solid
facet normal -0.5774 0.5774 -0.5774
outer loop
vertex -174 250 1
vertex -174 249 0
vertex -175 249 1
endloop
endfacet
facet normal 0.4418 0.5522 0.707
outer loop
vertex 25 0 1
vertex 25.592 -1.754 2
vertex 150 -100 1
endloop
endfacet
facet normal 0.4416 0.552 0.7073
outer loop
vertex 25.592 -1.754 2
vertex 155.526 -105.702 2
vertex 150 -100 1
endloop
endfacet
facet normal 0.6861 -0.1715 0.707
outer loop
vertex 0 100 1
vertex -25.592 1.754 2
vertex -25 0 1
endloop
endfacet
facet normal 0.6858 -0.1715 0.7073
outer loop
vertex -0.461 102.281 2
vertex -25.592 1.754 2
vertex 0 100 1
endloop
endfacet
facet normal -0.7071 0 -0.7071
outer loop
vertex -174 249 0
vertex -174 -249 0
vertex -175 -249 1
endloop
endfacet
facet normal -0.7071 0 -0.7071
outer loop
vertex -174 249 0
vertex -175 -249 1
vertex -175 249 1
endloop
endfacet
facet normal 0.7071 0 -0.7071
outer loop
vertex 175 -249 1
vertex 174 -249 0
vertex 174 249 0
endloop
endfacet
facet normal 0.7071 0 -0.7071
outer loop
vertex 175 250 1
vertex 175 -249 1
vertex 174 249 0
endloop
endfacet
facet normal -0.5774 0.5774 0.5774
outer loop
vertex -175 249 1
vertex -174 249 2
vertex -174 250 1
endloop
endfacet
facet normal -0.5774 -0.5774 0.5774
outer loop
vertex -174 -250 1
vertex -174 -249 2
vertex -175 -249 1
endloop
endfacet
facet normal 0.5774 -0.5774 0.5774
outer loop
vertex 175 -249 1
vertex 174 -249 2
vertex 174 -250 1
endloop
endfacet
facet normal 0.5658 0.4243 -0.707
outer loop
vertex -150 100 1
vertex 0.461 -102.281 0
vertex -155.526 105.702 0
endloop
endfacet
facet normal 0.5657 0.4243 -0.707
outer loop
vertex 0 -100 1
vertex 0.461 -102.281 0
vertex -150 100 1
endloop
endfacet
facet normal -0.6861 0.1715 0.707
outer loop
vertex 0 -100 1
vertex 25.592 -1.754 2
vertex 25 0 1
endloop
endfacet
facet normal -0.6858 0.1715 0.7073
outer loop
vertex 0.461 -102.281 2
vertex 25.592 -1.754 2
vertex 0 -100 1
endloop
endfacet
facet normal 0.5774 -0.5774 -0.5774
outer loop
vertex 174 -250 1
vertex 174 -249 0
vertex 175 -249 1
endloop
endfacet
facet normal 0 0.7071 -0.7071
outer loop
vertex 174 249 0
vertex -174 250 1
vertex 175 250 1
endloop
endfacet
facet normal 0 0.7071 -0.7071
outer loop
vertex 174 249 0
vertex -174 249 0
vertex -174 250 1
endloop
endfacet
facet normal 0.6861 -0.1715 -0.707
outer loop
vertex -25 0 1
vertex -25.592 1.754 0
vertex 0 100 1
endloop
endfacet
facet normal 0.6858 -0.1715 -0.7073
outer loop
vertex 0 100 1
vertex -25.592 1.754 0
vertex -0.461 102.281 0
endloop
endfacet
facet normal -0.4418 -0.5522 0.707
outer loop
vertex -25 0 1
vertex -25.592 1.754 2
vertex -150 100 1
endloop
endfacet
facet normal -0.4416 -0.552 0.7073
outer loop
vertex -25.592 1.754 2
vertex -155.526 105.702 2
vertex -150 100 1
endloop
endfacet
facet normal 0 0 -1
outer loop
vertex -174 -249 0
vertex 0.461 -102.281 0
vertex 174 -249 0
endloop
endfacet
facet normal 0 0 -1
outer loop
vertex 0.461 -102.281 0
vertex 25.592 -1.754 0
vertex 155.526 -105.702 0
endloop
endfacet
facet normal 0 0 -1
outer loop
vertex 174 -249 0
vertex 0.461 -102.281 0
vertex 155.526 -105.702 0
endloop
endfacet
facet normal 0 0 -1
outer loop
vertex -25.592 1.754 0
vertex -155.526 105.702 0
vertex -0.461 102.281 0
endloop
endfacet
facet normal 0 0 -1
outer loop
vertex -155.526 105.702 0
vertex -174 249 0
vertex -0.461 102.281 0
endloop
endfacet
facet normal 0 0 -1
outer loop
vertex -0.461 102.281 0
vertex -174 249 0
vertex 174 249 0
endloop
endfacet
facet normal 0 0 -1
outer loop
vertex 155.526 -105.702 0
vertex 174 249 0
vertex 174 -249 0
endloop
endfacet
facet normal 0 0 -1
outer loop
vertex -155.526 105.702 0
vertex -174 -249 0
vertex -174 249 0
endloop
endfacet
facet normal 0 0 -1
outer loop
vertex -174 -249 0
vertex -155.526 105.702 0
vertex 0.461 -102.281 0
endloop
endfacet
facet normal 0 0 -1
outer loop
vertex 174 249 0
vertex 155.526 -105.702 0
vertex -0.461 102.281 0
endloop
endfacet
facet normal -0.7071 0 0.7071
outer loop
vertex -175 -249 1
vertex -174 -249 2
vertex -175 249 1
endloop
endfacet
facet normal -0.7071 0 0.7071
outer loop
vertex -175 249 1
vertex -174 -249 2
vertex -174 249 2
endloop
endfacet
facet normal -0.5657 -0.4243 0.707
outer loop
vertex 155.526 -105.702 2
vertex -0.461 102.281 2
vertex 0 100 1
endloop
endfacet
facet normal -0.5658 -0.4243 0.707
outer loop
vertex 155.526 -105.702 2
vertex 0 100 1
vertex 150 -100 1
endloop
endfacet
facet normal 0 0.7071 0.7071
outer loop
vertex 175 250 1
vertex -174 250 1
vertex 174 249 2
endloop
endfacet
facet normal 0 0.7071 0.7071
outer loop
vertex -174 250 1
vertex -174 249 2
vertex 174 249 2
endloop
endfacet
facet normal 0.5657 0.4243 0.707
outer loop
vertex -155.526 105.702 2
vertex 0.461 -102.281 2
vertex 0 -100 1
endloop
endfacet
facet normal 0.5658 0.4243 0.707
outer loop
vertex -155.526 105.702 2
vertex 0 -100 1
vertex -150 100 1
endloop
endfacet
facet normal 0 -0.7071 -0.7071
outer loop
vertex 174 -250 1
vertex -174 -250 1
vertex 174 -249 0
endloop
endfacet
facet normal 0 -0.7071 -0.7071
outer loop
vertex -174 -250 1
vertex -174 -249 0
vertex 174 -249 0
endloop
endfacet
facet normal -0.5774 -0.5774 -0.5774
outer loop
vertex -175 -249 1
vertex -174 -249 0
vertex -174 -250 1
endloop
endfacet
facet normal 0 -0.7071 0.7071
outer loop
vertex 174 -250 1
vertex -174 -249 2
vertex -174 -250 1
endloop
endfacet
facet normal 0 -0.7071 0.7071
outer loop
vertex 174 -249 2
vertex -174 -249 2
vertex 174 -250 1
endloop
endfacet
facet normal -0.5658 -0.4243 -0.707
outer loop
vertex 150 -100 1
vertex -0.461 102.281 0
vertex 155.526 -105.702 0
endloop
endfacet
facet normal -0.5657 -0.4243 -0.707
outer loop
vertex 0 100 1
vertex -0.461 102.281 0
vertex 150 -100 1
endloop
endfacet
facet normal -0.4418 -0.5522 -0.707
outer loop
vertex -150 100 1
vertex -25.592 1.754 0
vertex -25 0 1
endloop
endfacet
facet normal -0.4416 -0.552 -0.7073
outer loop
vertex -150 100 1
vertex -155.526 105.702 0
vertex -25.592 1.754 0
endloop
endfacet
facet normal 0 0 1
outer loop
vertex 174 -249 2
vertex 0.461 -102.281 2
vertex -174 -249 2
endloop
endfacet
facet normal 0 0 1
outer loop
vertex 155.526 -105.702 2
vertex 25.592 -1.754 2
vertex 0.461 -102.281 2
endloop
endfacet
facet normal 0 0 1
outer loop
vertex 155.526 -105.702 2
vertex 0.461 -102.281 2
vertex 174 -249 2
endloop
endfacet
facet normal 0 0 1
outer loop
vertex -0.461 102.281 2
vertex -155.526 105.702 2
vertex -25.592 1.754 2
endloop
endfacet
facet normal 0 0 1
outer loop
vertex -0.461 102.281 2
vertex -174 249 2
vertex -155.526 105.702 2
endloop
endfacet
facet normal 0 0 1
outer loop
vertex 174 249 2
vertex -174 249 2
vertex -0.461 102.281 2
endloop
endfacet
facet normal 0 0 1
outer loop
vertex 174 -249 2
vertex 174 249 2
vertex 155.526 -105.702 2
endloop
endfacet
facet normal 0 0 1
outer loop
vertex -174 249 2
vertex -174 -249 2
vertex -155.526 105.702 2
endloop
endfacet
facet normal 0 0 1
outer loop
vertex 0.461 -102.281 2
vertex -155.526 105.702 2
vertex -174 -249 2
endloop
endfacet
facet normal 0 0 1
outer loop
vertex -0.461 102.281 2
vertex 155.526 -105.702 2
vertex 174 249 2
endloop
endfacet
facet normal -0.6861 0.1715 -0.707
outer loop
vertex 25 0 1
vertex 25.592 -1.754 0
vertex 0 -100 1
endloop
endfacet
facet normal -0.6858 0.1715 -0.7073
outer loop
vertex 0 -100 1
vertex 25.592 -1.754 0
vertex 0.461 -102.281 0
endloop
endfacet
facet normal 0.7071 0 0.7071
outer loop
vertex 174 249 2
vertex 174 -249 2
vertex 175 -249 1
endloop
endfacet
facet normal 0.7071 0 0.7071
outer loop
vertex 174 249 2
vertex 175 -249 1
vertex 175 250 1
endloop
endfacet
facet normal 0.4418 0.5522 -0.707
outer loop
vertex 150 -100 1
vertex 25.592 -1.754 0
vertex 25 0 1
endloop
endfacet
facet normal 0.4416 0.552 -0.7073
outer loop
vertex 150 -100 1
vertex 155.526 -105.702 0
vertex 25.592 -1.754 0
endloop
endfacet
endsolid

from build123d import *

# Parameters (mm, degrees)
F0_W     = 350
F0_H     = 500
F1_DEPTH = 2
F2_SIZE  = 0.99999


# Not quite as in the source:
# - a fillet or chamfer is up to 0.001 mm smaller than in the source, because OpenCascade refuses the exact size


with BuildPart() as f1:
    # F0 (on Top) → F1 (new body)
    with BuildSketch(Plane.XY):
        Rectangle(F0_W, F0_H)
        Polygon((150, 100), (150, -100), (0, -100), (-150, -100), (-150, 100), (0, 100), align=None, mode=Mode.SUBTRACT)
        Polygon((-150, -100), (0, -100), (-150, 100), align=None)
        Polygon((0, 100), (150, -100), (150, 100), align=None)
        Polygon((-25, 0), (0, 100), (-150, 100), align=None)
        Polygon((0, -100), (150, -100), (25, 0), align=None)
    extrude(amount=F1_DEPTH)

    # F2 (size 1 in the source; OpenCascade refuses exactly that, so slightly less here)
    f2_edges = [f1.edges().sort_by_distance(p)[0] for p in [
        (-75, 0, 2),
        (-87.5, 50, 2),
        (-12.5, 50, 2),
        (75, 0, 2),
        (87.5, -50, 2),
        (12.5, -50, 2),
        (0, -250, 2),
        (175, 0, 2),
        (0, 250, 2),
        (-175, 0, 2),
        (-75, 0, 0),
        (-87.5, 50, 0),
        (-12.5, 50, 0),
        (75, 0, 0),
        (87.5, -50, 0),
        (12.5, -50, 0),
        (0, -250, 0),
        (175, 0, 0),
        (0, 250, 0),
        (-175, 0, 0),
        (-175, -250, 1),
        (175, -250, 1),
        (-175, 250, 1),
    ]]
    chamfer(f2_edges, length=F2_SIZE)


solid = f1.part
